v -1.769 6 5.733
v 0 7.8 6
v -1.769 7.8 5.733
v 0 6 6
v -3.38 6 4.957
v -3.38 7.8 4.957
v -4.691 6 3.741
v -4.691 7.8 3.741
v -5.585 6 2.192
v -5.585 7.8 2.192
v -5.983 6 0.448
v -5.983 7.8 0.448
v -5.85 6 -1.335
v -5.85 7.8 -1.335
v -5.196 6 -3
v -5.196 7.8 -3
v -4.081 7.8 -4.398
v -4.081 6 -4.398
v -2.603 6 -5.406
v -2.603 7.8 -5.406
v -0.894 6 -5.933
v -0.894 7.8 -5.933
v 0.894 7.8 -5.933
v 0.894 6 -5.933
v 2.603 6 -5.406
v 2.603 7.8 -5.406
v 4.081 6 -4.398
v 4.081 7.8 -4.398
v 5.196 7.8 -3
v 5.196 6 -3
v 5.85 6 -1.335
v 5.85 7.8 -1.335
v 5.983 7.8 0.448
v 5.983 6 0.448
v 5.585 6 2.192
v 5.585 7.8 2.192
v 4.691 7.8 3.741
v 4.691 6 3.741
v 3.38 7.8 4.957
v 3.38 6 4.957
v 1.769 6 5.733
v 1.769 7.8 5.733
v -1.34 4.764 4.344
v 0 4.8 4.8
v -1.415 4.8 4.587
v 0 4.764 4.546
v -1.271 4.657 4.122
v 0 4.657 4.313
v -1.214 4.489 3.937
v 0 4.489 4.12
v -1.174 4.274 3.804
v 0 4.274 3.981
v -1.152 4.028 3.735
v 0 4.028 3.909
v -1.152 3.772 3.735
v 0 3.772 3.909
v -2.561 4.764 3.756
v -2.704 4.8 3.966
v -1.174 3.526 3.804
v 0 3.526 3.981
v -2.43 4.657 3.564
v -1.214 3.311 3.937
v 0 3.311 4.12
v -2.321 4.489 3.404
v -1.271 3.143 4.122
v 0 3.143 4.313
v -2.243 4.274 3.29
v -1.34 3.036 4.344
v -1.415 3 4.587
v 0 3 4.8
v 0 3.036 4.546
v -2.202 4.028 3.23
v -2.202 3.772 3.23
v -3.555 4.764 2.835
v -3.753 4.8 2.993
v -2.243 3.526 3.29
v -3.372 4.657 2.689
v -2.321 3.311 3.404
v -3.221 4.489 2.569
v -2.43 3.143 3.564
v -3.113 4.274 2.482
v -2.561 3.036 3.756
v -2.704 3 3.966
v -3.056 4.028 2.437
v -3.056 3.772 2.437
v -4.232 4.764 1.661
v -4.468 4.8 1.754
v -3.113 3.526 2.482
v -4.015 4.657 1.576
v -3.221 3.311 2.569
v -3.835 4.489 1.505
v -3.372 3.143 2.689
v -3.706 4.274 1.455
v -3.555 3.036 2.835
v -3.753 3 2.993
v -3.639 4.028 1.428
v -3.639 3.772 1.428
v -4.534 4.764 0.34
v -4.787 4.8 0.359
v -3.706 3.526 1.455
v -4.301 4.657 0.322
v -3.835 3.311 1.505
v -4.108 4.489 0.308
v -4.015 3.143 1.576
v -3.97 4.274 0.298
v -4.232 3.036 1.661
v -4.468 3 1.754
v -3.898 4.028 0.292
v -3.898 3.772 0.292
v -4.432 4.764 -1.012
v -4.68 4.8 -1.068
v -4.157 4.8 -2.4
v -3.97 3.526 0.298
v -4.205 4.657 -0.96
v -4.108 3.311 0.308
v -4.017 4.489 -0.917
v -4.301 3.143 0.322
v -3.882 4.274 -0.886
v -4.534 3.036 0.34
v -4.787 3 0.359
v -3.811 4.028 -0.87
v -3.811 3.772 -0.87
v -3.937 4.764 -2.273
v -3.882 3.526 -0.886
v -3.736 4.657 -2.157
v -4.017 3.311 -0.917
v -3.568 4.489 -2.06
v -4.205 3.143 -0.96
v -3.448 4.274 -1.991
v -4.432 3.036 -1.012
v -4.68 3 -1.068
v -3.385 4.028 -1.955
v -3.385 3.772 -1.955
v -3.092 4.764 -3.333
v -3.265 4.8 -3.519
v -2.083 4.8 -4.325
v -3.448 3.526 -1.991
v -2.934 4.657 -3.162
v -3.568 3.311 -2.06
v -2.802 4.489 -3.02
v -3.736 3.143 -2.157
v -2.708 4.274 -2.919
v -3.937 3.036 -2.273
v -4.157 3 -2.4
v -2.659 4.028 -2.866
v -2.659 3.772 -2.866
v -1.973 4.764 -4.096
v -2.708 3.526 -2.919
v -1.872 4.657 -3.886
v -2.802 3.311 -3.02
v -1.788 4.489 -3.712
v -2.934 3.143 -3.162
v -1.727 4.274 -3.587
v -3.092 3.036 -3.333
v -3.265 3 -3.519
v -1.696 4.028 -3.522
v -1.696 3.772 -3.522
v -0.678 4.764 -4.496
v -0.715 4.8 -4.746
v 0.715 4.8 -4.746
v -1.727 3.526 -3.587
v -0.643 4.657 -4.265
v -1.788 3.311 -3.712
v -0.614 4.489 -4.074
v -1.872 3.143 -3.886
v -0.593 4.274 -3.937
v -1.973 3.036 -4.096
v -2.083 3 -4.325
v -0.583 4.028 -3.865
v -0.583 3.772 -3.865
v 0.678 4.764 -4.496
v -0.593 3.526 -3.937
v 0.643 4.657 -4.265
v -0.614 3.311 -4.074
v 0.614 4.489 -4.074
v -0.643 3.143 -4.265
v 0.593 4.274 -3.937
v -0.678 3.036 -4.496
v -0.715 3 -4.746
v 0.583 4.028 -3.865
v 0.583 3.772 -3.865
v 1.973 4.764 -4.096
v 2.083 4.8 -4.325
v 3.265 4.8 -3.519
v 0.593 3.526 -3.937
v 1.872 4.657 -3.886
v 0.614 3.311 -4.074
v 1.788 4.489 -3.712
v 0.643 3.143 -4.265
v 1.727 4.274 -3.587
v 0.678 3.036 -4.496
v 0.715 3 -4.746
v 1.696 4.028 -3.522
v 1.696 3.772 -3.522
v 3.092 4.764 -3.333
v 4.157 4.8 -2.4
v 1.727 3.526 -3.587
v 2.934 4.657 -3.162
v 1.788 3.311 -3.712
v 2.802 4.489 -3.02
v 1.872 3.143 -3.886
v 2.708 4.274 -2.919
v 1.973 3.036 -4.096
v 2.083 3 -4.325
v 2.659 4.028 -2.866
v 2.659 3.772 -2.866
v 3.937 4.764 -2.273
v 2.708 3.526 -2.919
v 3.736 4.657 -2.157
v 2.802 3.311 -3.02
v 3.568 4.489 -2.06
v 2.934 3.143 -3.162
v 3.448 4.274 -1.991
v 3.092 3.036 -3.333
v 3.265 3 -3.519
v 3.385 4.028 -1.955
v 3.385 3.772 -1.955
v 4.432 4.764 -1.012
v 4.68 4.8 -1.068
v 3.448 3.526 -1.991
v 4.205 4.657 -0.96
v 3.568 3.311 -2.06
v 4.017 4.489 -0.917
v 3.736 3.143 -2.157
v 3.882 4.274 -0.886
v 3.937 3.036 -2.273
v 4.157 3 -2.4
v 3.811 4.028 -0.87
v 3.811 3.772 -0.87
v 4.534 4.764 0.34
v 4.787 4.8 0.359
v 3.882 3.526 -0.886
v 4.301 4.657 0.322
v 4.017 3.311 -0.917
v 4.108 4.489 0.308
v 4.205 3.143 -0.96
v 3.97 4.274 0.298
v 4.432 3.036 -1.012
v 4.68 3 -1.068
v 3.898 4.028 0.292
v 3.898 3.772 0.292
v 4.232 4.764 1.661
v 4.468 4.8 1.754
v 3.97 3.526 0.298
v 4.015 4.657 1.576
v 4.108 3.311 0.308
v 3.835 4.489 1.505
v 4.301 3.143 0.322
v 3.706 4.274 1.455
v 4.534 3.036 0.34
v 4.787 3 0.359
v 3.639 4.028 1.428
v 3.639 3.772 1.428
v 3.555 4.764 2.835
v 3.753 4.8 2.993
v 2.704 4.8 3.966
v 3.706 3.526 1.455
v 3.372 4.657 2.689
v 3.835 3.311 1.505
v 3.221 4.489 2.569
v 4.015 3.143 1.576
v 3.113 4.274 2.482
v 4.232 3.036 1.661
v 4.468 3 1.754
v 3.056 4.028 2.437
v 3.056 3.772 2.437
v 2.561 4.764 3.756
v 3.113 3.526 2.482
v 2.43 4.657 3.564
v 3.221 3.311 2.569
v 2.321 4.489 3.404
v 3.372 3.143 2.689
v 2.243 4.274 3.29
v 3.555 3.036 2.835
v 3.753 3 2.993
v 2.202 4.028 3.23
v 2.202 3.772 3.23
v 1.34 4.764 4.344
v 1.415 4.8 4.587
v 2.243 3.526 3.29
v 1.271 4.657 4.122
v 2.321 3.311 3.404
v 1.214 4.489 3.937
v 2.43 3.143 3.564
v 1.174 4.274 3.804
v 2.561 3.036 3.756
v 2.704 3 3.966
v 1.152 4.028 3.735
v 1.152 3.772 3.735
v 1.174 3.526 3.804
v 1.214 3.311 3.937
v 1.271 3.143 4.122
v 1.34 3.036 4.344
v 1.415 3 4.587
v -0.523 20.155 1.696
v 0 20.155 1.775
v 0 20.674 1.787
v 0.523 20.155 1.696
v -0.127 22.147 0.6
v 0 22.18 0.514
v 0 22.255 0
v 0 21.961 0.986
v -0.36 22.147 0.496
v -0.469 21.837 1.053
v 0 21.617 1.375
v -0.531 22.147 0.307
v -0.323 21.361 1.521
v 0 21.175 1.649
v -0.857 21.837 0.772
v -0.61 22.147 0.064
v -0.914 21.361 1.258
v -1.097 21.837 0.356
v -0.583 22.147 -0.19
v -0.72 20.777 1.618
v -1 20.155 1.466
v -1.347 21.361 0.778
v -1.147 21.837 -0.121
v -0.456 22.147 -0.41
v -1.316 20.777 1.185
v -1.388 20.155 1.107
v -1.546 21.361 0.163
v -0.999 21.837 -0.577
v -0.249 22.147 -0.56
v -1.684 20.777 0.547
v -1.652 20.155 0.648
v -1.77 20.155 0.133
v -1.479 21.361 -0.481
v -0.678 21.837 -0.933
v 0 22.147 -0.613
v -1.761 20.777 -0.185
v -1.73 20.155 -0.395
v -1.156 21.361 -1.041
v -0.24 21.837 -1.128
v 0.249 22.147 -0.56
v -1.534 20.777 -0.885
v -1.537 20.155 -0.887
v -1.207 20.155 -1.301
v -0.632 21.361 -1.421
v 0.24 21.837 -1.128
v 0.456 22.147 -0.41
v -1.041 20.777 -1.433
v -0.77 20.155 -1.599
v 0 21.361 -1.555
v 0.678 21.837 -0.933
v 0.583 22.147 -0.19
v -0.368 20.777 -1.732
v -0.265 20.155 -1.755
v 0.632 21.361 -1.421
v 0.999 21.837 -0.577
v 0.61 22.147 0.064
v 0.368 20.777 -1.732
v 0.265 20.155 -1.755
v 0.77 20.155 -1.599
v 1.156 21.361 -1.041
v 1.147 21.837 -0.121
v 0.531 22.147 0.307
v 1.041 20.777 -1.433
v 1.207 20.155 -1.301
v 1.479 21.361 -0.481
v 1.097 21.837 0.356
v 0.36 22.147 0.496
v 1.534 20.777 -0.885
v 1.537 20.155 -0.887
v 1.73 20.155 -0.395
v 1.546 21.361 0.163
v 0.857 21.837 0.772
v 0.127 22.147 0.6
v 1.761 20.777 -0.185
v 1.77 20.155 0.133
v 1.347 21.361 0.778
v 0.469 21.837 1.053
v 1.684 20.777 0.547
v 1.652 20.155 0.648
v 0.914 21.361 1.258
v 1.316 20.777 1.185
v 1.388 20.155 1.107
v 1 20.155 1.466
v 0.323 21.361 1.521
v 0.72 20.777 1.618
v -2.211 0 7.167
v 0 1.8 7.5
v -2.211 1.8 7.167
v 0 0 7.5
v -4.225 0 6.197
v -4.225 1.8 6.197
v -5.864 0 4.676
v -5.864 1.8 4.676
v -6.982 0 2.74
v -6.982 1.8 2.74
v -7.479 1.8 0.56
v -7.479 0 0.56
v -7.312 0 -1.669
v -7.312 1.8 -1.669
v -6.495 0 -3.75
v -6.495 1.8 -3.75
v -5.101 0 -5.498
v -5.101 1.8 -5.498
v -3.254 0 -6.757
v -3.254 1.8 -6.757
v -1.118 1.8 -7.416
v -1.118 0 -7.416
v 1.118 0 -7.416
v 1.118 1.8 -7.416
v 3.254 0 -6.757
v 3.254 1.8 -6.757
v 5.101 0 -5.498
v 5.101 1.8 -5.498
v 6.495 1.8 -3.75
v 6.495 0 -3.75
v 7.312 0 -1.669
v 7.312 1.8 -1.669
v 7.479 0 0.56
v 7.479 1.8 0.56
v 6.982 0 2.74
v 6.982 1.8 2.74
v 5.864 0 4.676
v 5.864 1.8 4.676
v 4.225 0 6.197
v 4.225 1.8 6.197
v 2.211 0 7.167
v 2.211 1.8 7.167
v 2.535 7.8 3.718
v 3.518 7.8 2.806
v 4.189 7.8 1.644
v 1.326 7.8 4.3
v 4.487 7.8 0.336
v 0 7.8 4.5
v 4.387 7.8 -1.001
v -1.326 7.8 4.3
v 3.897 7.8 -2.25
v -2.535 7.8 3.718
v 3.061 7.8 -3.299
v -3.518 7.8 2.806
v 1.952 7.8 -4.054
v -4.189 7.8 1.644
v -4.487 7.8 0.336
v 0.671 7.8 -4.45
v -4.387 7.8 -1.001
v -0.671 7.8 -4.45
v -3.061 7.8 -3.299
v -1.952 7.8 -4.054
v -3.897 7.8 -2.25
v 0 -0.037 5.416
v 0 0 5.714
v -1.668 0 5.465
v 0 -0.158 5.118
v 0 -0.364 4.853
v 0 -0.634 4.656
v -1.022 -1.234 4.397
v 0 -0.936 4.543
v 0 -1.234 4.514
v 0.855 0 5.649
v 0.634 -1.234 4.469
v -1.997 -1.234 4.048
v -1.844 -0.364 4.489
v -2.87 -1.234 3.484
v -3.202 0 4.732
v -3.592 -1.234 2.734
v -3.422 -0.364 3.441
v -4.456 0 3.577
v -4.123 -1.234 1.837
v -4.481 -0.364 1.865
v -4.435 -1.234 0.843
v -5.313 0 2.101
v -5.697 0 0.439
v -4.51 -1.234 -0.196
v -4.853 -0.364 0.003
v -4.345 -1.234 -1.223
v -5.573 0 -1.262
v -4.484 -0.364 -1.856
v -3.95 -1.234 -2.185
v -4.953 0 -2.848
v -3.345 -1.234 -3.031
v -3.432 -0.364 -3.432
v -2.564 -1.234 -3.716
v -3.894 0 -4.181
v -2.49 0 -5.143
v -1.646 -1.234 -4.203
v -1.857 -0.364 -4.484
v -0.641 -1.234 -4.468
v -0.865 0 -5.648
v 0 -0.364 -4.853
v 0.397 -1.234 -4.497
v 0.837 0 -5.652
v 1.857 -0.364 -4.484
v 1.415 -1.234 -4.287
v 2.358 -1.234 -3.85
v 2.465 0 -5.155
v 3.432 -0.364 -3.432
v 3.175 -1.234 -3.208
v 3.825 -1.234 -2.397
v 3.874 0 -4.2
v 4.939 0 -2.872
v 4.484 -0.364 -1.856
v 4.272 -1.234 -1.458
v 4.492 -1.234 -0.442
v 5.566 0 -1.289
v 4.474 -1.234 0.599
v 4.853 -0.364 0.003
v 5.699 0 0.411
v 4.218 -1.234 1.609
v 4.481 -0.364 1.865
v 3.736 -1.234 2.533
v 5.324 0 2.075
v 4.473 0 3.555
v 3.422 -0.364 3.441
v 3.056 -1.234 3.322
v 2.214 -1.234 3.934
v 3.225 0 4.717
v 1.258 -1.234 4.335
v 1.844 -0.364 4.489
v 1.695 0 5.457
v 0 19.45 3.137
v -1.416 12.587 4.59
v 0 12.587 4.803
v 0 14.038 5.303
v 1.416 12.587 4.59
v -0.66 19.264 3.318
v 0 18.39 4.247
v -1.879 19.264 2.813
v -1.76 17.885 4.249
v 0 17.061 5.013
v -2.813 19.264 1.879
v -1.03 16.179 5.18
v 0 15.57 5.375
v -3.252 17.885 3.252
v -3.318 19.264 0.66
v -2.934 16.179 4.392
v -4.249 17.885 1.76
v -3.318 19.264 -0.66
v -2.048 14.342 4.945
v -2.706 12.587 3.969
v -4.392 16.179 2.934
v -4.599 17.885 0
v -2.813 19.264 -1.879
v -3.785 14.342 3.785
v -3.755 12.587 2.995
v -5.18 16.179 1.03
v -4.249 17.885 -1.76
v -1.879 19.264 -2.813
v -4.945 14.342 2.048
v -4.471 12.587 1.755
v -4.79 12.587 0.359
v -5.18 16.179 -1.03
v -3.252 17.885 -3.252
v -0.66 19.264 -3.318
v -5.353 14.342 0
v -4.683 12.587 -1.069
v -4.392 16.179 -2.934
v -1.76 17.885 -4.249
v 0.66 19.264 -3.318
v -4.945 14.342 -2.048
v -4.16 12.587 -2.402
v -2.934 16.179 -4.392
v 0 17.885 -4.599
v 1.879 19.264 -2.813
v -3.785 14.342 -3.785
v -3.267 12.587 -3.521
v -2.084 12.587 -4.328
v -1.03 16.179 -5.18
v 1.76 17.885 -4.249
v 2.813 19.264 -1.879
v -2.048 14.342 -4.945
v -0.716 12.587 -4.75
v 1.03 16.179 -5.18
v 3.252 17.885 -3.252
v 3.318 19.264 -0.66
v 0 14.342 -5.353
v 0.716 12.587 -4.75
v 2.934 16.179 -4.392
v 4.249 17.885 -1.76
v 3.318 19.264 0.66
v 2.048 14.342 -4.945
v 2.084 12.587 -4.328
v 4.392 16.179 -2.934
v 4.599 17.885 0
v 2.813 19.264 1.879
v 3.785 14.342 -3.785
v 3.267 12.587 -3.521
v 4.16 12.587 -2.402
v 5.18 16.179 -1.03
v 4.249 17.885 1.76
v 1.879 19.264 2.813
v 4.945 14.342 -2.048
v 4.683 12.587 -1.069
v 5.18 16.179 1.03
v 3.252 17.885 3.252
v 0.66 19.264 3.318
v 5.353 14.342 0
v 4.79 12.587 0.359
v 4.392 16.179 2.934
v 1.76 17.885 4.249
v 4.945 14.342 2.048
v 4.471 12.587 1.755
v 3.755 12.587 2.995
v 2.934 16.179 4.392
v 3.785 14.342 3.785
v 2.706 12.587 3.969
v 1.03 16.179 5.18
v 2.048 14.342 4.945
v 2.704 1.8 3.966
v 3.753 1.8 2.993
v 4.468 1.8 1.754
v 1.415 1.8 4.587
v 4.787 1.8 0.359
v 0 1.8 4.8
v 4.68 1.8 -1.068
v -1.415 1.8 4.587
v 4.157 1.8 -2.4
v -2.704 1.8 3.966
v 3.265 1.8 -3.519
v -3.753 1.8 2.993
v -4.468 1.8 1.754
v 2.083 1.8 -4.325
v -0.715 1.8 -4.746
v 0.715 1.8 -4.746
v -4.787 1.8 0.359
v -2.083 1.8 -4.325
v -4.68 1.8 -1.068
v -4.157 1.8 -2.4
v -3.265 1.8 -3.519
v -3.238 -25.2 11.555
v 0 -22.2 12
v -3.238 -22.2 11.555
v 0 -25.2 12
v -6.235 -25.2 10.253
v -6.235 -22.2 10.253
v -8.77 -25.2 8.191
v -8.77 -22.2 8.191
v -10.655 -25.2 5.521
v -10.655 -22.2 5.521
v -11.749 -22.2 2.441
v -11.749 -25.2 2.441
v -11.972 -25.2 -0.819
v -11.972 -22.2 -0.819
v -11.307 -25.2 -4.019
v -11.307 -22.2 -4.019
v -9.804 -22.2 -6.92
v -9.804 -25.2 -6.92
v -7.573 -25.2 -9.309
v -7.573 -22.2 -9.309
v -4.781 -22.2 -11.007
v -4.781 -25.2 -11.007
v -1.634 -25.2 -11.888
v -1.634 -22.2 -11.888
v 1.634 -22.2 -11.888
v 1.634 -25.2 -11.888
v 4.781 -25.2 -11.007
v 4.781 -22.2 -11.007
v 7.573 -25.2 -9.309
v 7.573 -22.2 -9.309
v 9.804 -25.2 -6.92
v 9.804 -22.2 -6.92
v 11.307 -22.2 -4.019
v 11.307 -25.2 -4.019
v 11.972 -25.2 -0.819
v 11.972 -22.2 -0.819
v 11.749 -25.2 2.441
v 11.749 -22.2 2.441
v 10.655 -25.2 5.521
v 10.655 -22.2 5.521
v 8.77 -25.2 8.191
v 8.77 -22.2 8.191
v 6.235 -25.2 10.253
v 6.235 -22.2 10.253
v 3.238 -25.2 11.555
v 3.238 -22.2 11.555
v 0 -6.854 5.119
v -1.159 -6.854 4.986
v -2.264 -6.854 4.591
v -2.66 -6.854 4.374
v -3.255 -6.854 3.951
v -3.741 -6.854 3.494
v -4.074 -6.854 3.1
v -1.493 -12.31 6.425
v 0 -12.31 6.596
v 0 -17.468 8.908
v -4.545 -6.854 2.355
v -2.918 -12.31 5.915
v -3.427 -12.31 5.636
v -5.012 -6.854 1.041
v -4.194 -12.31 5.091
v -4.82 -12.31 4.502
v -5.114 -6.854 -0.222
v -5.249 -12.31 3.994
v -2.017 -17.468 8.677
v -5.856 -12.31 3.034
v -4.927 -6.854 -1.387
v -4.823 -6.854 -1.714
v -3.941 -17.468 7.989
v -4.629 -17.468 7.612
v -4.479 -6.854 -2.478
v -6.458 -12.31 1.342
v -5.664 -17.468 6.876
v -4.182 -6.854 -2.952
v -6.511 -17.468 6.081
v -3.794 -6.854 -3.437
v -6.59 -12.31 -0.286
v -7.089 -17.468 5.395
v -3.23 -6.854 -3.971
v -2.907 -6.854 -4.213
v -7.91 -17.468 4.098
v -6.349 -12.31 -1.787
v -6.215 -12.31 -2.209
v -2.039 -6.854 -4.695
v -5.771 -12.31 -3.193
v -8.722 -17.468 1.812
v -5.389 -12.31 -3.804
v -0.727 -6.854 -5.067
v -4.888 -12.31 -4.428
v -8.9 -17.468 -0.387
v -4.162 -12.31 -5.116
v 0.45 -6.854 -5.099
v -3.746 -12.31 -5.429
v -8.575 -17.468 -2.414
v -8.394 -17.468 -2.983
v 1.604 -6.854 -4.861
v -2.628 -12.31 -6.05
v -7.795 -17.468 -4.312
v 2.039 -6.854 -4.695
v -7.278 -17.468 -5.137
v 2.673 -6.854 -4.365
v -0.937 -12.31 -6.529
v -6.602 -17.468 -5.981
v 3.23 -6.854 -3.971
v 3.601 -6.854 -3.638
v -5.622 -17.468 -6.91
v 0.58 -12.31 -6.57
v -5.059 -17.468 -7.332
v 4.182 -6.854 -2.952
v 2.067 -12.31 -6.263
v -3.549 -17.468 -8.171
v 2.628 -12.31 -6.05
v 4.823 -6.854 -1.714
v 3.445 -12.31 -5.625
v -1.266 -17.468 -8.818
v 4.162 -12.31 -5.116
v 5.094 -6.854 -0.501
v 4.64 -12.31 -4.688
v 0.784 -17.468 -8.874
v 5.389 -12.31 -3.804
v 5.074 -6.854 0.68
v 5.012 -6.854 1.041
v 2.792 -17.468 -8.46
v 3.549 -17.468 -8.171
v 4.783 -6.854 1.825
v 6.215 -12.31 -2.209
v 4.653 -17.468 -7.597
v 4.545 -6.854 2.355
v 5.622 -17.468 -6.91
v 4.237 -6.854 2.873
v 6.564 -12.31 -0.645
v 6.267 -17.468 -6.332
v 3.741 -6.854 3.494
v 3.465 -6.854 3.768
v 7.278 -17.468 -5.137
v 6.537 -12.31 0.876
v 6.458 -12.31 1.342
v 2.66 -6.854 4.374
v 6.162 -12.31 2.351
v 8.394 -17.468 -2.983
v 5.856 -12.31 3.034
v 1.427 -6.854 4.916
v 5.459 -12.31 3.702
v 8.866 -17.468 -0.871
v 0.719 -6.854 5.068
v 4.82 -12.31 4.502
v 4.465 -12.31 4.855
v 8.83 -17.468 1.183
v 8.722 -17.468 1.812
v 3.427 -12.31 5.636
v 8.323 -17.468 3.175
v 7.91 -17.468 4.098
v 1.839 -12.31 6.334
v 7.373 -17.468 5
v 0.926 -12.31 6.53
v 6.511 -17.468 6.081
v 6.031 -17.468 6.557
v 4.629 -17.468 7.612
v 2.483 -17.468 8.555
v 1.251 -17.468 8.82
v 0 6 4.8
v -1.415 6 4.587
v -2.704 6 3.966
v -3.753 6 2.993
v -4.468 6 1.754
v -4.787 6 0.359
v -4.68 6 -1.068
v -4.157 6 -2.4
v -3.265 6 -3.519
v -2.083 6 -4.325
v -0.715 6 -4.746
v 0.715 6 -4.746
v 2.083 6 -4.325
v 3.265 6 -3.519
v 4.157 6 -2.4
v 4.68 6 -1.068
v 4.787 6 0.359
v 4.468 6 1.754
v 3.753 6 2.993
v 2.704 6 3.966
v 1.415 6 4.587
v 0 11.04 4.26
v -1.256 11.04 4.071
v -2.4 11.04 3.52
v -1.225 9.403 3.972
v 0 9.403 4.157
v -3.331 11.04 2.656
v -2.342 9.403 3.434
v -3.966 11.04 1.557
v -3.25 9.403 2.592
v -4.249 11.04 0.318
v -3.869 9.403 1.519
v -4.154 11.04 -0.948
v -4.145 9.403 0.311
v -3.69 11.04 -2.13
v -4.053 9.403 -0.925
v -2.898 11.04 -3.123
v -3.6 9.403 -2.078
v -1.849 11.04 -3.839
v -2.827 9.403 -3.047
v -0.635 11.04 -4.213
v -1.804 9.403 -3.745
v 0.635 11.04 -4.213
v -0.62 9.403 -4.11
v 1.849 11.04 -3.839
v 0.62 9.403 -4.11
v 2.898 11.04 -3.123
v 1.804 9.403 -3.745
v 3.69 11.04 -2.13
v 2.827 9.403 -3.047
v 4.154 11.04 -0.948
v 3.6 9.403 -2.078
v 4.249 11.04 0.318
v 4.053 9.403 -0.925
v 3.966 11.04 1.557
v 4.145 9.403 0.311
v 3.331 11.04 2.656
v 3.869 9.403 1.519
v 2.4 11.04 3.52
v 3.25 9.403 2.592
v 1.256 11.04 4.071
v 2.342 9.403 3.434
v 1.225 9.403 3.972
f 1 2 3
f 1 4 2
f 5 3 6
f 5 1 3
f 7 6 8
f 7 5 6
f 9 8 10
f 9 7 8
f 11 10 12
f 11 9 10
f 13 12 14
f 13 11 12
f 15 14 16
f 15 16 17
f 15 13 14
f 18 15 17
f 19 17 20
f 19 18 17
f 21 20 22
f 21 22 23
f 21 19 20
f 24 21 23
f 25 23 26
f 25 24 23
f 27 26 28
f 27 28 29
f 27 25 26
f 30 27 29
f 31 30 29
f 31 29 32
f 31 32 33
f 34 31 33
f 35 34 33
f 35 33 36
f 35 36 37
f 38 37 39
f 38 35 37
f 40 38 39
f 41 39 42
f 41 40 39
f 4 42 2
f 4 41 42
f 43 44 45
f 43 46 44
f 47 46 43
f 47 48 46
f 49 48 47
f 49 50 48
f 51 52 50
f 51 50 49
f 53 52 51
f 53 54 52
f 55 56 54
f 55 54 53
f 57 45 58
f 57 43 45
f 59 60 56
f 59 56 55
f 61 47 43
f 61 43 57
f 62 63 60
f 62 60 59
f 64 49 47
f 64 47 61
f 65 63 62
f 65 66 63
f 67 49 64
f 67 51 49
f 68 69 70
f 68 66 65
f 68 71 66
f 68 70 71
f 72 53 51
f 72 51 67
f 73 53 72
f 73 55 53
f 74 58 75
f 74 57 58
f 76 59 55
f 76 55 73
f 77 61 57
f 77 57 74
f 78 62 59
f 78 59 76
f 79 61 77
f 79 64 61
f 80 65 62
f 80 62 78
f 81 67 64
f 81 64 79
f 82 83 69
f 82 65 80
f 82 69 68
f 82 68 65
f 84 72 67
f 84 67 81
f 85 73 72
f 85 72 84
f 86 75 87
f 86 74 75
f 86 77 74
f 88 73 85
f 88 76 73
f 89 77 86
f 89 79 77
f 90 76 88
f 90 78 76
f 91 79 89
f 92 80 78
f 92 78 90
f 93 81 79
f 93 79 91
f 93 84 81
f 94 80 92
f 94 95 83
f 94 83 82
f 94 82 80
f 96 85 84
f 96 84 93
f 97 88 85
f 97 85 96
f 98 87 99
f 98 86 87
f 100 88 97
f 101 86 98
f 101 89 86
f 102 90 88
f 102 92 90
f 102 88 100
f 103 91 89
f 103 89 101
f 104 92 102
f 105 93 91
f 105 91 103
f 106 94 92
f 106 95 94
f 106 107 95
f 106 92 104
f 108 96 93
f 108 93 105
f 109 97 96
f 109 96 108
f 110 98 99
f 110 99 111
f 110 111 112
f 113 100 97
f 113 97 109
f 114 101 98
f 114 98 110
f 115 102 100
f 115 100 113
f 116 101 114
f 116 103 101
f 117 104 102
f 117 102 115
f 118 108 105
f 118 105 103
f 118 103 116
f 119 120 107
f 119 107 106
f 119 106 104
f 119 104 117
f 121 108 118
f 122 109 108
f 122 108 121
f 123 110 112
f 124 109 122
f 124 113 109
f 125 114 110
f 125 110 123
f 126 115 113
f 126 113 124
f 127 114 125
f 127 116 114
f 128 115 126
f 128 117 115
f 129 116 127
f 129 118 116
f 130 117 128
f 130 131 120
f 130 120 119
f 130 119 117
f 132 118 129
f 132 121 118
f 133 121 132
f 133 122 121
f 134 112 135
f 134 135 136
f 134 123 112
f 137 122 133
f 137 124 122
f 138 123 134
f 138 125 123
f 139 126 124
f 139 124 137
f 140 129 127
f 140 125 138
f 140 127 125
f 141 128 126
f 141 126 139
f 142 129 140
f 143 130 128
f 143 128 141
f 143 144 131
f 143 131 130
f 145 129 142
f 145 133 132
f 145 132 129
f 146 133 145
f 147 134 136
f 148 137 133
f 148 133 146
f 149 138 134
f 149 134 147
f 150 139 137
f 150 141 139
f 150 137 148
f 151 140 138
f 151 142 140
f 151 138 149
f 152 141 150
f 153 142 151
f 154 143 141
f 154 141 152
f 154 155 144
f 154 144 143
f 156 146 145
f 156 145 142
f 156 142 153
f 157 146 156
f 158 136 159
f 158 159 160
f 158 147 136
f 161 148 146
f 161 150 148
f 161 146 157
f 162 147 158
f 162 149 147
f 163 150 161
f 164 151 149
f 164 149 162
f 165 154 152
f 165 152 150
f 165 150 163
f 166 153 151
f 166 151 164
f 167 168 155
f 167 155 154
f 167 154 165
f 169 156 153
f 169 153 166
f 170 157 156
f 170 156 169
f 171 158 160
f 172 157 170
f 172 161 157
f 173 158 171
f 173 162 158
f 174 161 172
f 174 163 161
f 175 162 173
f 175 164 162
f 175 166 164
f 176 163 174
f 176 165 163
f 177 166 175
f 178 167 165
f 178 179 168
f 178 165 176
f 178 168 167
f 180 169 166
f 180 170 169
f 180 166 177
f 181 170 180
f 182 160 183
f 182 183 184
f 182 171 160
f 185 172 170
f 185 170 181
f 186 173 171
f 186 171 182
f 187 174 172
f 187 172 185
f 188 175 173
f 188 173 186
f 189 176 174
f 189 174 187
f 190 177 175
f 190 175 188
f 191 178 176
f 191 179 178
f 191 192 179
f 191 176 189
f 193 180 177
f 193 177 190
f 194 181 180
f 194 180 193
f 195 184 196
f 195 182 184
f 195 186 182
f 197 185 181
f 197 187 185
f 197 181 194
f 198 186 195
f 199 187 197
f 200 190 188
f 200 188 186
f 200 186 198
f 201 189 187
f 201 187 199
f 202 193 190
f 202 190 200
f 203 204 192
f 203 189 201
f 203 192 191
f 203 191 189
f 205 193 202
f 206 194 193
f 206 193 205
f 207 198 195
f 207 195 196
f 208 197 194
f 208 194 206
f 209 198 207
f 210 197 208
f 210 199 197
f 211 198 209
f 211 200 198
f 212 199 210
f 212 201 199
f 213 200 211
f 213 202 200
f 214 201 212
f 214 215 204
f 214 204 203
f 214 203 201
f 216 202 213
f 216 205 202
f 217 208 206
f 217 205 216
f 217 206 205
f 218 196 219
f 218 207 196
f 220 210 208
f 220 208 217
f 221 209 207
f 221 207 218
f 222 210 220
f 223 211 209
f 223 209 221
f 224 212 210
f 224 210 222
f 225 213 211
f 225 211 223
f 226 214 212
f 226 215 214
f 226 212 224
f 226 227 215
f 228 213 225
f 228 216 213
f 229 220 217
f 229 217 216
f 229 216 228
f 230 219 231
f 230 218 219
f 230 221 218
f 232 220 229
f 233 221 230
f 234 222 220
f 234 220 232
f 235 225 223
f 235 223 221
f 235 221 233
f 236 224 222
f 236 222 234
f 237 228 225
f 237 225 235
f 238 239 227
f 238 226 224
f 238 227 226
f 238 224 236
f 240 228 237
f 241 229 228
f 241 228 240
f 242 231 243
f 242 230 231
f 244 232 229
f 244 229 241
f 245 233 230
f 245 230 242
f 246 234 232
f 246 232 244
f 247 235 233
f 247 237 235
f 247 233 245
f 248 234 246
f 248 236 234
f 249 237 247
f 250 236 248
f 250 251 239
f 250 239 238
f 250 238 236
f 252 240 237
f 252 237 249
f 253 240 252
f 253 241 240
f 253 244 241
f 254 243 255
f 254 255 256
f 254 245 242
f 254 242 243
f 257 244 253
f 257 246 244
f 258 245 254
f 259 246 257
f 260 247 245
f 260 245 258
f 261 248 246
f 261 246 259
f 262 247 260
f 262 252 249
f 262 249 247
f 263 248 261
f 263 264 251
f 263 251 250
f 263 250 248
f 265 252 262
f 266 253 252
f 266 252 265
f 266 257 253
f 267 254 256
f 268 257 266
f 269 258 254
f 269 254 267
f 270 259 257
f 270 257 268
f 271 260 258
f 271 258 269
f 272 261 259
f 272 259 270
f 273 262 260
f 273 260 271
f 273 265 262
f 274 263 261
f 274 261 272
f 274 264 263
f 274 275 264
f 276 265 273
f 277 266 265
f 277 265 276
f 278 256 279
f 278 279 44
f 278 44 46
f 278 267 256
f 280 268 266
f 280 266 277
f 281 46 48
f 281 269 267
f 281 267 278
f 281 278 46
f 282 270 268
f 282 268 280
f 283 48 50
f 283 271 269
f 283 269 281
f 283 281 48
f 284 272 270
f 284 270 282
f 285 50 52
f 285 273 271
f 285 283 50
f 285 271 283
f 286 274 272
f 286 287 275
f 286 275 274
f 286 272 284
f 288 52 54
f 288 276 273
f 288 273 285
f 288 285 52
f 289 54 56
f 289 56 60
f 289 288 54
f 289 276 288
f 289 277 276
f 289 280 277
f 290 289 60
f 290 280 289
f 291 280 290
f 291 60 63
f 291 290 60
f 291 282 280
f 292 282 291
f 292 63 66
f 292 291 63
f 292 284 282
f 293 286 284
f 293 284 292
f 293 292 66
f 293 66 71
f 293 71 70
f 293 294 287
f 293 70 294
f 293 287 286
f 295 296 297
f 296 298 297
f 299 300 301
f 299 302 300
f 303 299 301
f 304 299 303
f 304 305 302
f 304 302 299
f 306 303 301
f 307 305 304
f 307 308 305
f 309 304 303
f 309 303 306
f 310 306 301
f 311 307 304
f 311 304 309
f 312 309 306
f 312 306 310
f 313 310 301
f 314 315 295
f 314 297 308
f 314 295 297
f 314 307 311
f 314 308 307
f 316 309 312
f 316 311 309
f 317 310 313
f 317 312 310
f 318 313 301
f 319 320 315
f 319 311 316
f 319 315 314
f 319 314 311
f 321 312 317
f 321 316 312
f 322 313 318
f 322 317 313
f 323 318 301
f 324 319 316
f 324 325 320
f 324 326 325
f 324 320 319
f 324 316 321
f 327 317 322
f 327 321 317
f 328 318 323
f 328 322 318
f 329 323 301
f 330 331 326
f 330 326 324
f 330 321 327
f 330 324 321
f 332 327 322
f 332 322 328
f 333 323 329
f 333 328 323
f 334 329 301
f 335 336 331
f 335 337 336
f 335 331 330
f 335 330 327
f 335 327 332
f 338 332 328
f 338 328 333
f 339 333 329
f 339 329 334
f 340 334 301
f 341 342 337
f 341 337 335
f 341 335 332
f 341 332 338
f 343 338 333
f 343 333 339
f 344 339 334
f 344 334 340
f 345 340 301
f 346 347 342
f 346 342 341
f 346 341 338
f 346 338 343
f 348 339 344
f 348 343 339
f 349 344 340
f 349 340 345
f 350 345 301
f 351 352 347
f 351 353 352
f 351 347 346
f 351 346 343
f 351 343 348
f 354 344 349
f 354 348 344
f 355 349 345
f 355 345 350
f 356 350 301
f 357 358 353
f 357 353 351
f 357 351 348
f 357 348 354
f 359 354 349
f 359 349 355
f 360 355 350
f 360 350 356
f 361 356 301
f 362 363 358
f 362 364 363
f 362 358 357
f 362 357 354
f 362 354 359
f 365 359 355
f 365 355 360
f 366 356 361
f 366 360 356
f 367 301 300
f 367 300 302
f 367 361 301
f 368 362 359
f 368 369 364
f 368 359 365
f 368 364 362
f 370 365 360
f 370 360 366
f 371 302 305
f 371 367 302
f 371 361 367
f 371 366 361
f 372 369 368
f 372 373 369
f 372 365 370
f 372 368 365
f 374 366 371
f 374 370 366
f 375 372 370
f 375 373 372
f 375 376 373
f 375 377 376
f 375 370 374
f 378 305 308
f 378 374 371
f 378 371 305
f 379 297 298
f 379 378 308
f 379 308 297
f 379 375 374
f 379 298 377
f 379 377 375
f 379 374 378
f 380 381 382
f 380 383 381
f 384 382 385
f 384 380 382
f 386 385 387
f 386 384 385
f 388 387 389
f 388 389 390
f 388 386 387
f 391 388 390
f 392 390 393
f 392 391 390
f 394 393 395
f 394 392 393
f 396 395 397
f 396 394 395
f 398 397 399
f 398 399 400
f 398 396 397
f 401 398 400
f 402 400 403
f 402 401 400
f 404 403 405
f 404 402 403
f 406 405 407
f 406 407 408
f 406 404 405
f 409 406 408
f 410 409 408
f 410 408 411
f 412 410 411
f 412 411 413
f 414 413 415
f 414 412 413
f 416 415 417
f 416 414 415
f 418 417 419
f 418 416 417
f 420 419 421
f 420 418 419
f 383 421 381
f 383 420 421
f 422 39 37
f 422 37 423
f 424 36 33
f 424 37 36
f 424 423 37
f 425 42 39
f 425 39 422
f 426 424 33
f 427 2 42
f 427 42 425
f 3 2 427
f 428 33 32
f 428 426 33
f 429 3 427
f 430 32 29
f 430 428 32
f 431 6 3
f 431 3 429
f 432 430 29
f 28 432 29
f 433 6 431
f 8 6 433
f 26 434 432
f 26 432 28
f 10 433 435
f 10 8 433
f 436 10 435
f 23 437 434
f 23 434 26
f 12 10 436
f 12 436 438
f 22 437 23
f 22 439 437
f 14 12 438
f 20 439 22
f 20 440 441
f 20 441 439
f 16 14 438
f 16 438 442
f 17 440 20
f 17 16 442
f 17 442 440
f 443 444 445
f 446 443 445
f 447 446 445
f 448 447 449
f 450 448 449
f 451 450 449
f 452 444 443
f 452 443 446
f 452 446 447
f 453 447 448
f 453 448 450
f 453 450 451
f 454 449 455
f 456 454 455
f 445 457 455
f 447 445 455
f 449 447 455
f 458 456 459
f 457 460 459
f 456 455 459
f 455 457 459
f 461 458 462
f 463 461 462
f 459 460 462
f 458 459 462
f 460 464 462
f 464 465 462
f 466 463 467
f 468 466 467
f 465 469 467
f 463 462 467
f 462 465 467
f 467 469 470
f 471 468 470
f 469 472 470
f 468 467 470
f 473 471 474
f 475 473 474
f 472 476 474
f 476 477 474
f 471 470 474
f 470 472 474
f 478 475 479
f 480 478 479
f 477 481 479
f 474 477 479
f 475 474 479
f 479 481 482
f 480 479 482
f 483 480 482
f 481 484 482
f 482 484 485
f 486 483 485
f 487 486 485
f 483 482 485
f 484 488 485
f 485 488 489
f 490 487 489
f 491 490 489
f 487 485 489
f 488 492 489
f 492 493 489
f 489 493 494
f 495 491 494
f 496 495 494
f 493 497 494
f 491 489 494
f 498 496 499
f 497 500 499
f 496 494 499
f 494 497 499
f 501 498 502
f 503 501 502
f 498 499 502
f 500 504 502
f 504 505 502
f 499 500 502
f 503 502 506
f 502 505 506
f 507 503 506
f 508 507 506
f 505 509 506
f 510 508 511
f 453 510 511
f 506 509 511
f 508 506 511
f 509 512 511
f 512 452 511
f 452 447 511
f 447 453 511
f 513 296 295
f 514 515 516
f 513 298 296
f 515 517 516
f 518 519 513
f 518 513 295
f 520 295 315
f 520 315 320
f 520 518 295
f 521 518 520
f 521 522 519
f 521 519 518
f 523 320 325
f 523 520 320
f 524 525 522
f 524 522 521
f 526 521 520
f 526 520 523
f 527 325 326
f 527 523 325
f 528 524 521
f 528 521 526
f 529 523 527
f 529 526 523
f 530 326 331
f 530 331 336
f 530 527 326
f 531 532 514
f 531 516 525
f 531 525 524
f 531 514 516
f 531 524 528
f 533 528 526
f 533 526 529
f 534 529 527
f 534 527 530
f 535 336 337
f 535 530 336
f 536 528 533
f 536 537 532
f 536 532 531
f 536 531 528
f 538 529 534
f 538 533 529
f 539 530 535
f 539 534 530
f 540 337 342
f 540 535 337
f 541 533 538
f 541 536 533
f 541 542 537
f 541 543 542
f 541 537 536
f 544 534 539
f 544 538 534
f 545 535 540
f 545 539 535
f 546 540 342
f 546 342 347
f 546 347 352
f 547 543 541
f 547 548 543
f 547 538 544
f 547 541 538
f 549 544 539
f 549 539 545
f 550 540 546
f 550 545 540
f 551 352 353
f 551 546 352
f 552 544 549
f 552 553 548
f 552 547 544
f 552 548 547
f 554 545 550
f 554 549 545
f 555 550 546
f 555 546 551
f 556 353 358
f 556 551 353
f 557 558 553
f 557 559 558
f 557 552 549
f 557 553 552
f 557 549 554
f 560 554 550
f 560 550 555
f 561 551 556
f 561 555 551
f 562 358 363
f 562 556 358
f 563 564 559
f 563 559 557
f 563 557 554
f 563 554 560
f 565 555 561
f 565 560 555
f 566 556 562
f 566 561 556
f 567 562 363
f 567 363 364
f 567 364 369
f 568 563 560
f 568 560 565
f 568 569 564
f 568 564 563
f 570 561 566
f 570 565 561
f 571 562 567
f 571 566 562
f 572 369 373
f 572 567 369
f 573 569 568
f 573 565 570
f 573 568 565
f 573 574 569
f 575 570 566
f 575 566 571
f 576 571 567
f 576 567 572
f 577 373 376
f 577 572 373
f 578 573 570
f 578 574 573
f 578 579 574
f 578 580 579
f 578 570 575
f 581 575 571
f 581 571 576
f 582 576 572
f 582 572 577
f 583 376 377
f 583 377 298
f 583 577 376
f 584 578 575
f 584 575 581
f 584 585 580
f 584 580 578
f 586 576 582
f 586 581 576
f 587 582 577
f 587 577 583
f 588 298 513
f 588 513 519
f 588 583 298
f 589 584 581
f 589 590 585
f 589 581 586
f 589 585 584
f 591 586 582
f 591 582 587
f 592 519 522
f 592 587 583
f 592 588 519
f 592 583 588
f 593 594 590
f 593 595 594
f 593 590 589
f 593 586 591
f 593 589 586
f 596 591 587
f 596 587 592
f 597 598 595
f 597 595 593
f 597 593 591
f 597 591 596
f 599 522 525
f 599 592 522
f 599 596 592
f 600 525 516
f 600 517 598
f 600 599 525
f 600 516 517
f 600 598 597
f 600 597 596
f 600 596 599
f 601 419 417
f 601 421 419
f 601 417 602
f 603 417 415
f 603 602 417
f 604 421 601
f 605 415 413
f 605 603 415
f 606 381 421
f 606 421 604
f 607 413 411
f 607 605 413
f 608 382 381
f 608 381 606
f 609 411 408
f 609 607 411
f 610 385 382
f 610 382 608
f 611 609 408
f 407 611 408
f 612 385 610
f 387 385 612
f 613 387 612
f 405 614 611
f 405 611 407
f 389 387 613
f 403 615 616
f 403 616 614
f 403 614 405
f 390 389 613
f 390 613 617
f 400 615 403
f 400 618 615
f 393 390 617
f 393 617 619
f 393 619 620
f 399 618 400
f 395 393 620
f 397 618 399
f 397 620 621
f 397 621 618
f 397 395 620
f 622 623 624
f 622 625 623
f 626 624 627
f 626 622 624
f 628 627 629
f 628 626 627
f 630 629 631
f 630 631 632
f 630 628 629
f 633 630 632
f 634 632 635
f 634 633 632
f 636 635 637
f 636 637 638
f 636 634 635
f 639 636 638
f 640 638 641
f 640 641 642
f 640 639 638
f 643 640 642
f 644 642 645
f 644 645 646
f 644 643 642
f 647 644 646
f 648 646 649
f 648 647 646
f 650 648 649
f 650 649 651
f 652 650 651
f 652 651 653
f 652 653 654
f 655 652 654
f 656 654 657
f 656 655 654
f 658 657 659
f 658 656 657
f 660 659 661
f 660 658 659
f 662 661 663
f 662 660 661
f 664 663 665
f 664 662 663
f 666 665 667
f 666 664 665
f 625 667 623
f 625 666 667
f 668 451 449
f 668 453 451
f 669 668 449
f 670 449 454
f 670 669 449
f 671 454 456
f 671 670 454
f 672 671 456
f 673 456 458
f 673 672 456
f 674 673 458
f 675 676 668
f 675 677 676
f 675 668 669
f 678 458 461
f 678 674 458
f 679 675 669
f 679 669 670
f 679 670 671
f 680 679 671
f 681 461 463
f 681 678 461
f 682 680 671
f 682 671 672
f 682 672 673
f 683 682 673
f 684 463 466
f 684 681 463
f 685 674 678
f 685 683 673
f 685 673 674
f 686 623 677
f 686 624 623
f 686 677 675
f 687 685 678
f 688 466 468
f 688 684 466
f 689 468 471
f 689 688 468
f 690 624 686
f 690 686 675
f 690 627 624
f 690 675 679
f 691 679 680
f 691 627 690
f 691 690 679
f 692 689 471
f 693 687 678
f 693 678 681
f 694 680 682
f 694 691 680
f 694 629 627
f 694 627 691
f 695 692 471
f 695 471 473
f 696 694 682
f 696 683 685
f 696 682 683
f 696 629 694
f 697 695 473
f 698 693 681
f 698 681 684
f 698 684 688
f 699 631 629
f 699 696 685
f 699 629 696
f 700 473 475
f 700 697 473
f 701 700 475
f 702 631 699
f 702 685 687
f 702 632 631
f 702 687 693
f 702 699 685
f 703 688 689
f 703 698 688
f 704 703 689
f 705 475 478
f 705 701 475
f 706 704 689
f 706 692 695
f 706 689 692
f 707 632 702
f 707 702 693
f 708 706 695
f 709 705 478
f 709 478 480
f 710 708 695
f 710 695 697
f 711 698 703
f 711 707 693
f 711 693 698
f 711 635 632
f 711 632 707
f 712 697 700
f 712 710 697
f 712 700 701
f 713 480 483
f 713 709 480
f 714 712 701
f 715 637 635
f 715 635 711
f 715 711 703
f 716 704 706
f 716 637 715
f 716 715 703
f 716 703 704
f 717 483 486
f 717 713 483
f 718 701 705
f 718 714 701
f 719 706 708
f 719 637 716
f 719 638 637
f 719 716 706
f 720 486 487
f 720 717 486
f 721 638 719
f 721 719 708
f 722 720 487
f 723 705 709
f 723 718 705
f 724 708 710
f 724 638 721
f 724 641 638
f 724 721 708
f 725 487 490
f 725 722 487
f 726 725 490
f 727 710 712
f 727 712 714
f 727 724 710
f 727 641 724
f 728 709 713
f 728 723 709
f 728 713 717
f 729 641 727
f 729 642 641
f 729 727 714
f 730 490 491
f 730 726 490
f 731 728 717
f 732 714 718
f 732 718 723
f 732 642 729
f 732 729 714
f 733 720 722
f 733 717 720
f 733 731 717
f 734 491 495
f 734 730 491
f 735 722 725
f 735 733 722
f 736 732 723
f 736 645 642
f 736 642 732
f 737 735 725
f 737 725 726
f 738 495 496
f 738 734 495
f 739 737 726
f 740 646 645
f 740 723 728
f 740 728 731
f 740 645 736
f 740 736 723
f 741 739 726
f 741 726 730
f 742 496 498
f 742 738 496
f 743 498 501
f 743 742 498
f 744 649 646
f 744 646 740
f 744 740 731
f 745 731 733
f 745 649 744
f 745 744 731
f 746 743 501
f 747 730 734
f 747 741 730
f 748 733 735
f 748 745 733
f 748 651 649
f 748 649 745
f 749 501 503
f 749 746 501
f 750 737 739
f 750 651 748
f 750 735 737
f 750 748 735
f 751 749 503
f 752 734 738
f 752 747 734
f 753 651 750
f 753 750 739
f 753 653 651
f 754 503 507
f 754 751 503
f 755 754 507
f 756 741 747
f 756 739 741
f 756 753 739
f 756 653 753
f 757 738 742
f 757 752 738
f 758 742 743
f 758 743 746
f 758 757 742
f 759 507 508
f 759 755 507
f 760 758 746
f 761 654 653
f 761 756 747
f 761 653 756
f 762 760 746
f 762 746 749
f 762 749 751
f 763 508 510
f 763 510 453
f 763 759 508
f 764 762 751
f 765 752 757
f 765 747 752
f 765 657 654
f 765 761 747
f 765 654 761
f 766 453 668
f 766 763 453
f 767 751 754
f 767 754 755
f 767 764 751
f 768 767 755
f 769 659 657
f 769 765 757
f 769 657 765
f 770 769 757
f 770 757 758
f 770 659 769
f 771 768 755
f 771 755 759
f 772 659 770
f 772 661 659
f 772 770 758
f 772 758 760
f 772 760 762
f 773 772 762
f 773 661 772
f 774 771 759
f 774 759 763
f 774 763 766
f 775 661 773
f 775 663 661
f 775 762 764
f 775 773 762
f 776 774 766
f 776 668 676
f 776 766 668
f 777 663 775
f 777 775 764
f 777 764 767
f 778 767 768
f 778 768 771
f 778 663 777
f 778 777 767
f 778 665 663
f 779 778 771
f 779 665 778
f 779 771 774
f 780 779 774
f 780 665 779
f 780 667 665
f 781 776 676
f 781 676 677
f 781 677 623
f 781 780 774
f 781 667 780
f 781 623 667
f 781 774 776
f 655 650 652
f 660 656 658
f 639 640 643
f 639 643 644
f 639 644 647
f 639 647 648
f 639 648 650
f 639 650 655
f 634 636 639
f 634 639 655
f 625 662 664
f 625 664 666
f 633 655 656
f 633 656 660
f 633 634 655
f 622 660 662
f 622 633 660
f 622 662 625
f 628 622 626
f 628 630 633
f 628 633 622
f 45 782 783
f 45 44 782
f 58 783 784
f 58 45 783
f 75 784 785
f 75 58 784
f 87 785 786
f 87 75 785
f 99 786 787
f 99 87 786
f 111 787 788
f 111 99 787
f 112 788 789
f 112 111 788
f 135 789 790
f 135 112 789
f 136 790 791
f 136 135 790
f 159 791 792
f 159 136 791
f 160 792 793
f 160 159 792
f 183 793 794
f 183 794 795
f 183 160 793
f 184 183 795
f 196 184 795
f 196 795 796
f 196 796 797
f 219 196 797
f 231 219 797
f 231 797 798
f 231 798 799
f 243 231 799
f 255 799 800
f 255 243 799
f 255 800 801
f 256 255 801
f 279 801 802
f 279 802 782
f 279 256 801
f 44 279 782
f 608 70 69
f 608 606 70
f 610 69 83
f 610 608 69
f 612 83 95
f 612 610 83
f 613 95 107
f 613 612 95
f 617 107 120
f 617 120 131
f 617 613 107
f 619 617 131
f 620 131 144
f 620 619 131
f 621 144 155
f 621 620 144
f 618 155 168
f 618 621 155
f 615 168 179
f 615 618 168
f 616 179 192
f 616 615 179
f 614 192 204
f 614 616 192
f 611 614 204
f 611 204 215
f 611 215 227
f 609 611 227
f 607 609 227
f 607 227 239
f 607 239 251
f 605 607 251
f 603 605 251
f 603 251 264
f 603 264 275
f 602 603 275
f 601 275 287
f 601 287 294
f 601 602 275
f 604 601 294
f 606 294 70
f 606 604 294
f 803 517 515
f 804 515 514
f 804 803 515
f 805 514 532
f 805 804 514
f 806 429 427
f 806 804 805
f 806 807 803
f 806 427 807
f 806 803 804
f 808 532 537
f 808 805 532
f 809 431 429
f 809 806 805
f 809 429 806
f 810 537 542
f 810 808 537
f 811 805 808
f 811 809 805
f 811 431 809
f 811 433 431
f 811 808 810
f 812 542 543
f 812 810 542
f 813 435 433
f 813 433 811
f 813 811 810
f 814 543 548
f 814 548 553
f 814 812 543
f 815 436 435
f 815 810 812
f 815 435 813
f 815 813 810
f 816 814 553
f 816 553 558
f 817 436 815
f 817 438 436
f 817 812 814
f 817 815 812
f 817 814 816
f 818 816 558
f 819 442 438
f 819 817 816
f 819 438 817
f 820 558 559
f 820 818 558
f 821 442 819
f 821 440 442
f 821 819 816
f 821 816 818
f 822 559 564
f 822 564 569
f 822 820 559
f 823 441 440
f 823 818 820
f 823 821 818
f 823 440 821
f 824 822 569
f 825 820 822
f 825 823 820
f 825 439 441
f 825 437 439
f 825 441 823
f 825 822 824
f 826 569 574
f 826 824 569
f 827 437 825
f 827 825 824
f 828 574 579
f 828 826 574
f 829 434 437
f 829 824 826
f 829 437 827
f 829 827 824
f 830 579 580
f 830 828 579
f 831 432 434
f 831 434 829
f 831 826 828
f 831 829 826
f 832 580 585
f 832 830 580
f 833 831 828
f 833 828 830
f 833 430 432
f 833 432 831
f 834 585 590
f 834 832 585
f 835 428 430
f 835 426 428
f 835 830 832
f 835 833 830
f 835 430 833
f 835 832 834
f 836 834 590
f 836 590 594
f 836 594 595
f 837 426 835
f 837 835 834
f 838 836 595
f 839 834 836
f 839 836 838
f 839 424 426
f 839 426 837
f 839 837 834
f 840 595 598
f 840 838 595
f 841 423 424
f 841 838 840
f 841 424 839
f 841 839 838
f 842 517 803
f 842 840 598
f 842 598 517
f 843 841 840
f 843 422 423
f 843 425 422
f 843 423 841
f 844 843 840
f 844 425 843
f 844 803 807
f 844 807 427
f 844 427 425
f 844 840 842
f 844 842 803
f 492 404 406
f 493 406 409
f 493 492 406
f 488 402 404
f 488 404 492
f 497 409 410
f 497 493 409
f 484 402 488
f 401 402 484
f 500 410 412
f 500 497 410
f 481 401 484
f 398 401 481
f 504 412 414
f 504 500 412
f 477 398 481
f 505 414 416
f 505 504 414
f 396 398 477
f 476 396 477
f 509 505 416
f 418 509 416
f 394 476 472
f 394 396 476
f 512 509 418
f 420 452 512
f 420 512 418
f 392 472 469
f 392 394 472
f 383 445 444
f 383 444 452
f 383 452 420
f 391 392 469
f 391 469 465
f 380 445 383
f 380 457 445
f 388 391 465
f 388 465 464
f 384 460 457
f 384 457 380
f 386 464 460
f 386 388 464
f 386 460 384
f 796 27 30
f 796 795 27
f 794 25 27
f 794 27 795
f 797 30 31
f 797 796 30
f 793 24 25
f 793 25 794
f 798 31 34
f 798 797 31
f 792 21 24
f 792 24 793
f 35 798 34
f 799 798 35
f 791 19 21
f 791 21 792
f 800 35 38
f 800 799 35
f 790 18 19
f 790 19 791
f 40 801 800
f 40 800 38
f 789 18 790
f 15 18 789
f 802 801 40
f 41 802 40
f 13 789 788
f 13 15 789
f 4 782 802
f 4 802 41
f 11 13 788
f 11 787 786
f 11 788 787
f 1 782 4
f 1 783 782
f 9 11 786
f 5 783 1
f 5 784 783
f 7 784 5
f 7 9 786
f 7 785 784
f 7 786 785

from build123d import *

# Parameters (mm, degrees)
FILLET1_R     = 2
SCALE_1_SCALE = 0.6


with BuildPart() as part:
    # Sketch1 → Revolve1 (revolve)
    with BuildSketch(Plane.XY, mode=Mode.PRIVATE) as revolve1_sk:
        with BuildLine():
            Line((0, -42), (0, 37.091148677))
            ThreePointArc((0, 37.091148677), (2.291287847, 36.02764035), (2.958039892, 33.591148677))
            ThreePointArc((2.958039892, 33.591148677), (8.355680086, 28.435189692), (8.005599308, 20.978925468))
            ThreePointArc((8.005599308, 20.978925468), (6.920726173, 17.042188603), (7.5, 13))
            Line((7.5, 13), (10, 13))
            Line((10, 13), (10, 10))
            Line((10, 10), (8, 10))
            Line((8, 10), (8, 8))
            ThreePointArc((8, 8), (6.5, 6.5), (8, 5))
            Line((8, 5), (8, 3))
            Line((8, 3), (12.5, 3))
            Line((12.5, 3), (12.5, 0))
            Line((12.5, 0), (7.5, 0))
            ThreePointArc((7.5, 0), (10.655312326, -19.545502593), (20, -37))
            Line((20, -37), (20, -42))
            Line((20, -42), (0, -42))
        make_face()
    revolve(revolve1_sk.sketch.rotate(Axis((0, 46.430278851, 0), (0, -1, 0)), 90), axis=Axis((0, 46.430278851, 0), (0, -1, 0)))

    # Fillet1
    fillet1_edges = [part.edges().sort_by_distance(p)[0] for p in [
        (0, 0, -7.5),
    ]]
    fillet(fillet1_edges, radius=FILLET1_R)


with BuildPart() as part_1:
    # 缩放比例1: scaled about (0, 0, 0)
    add(part.part.scale(SCALE_1_SCALE))


solid = part_1.part
